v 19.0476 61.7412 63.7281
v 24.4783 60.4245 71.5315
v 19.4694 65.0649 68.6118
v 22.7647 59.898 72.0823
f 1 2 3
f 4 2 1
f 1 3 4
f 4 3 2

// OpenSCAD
// Auto-generated auxetic polyhedron
points = [
    [19.469372, 65.064948, 68.611792],
    [24.478326, 60.424467, 71.531533],
    [19.047628, 61.741216, 63.728135],
    [22.764670, 59.897969, 72.082260],
];

faces = [
    [0, 1, 2],
    [2, 1, 3],
    [3, 0, 2],
    [1, 0, 3],
];

polyhedron(points = points, faces = faces);
